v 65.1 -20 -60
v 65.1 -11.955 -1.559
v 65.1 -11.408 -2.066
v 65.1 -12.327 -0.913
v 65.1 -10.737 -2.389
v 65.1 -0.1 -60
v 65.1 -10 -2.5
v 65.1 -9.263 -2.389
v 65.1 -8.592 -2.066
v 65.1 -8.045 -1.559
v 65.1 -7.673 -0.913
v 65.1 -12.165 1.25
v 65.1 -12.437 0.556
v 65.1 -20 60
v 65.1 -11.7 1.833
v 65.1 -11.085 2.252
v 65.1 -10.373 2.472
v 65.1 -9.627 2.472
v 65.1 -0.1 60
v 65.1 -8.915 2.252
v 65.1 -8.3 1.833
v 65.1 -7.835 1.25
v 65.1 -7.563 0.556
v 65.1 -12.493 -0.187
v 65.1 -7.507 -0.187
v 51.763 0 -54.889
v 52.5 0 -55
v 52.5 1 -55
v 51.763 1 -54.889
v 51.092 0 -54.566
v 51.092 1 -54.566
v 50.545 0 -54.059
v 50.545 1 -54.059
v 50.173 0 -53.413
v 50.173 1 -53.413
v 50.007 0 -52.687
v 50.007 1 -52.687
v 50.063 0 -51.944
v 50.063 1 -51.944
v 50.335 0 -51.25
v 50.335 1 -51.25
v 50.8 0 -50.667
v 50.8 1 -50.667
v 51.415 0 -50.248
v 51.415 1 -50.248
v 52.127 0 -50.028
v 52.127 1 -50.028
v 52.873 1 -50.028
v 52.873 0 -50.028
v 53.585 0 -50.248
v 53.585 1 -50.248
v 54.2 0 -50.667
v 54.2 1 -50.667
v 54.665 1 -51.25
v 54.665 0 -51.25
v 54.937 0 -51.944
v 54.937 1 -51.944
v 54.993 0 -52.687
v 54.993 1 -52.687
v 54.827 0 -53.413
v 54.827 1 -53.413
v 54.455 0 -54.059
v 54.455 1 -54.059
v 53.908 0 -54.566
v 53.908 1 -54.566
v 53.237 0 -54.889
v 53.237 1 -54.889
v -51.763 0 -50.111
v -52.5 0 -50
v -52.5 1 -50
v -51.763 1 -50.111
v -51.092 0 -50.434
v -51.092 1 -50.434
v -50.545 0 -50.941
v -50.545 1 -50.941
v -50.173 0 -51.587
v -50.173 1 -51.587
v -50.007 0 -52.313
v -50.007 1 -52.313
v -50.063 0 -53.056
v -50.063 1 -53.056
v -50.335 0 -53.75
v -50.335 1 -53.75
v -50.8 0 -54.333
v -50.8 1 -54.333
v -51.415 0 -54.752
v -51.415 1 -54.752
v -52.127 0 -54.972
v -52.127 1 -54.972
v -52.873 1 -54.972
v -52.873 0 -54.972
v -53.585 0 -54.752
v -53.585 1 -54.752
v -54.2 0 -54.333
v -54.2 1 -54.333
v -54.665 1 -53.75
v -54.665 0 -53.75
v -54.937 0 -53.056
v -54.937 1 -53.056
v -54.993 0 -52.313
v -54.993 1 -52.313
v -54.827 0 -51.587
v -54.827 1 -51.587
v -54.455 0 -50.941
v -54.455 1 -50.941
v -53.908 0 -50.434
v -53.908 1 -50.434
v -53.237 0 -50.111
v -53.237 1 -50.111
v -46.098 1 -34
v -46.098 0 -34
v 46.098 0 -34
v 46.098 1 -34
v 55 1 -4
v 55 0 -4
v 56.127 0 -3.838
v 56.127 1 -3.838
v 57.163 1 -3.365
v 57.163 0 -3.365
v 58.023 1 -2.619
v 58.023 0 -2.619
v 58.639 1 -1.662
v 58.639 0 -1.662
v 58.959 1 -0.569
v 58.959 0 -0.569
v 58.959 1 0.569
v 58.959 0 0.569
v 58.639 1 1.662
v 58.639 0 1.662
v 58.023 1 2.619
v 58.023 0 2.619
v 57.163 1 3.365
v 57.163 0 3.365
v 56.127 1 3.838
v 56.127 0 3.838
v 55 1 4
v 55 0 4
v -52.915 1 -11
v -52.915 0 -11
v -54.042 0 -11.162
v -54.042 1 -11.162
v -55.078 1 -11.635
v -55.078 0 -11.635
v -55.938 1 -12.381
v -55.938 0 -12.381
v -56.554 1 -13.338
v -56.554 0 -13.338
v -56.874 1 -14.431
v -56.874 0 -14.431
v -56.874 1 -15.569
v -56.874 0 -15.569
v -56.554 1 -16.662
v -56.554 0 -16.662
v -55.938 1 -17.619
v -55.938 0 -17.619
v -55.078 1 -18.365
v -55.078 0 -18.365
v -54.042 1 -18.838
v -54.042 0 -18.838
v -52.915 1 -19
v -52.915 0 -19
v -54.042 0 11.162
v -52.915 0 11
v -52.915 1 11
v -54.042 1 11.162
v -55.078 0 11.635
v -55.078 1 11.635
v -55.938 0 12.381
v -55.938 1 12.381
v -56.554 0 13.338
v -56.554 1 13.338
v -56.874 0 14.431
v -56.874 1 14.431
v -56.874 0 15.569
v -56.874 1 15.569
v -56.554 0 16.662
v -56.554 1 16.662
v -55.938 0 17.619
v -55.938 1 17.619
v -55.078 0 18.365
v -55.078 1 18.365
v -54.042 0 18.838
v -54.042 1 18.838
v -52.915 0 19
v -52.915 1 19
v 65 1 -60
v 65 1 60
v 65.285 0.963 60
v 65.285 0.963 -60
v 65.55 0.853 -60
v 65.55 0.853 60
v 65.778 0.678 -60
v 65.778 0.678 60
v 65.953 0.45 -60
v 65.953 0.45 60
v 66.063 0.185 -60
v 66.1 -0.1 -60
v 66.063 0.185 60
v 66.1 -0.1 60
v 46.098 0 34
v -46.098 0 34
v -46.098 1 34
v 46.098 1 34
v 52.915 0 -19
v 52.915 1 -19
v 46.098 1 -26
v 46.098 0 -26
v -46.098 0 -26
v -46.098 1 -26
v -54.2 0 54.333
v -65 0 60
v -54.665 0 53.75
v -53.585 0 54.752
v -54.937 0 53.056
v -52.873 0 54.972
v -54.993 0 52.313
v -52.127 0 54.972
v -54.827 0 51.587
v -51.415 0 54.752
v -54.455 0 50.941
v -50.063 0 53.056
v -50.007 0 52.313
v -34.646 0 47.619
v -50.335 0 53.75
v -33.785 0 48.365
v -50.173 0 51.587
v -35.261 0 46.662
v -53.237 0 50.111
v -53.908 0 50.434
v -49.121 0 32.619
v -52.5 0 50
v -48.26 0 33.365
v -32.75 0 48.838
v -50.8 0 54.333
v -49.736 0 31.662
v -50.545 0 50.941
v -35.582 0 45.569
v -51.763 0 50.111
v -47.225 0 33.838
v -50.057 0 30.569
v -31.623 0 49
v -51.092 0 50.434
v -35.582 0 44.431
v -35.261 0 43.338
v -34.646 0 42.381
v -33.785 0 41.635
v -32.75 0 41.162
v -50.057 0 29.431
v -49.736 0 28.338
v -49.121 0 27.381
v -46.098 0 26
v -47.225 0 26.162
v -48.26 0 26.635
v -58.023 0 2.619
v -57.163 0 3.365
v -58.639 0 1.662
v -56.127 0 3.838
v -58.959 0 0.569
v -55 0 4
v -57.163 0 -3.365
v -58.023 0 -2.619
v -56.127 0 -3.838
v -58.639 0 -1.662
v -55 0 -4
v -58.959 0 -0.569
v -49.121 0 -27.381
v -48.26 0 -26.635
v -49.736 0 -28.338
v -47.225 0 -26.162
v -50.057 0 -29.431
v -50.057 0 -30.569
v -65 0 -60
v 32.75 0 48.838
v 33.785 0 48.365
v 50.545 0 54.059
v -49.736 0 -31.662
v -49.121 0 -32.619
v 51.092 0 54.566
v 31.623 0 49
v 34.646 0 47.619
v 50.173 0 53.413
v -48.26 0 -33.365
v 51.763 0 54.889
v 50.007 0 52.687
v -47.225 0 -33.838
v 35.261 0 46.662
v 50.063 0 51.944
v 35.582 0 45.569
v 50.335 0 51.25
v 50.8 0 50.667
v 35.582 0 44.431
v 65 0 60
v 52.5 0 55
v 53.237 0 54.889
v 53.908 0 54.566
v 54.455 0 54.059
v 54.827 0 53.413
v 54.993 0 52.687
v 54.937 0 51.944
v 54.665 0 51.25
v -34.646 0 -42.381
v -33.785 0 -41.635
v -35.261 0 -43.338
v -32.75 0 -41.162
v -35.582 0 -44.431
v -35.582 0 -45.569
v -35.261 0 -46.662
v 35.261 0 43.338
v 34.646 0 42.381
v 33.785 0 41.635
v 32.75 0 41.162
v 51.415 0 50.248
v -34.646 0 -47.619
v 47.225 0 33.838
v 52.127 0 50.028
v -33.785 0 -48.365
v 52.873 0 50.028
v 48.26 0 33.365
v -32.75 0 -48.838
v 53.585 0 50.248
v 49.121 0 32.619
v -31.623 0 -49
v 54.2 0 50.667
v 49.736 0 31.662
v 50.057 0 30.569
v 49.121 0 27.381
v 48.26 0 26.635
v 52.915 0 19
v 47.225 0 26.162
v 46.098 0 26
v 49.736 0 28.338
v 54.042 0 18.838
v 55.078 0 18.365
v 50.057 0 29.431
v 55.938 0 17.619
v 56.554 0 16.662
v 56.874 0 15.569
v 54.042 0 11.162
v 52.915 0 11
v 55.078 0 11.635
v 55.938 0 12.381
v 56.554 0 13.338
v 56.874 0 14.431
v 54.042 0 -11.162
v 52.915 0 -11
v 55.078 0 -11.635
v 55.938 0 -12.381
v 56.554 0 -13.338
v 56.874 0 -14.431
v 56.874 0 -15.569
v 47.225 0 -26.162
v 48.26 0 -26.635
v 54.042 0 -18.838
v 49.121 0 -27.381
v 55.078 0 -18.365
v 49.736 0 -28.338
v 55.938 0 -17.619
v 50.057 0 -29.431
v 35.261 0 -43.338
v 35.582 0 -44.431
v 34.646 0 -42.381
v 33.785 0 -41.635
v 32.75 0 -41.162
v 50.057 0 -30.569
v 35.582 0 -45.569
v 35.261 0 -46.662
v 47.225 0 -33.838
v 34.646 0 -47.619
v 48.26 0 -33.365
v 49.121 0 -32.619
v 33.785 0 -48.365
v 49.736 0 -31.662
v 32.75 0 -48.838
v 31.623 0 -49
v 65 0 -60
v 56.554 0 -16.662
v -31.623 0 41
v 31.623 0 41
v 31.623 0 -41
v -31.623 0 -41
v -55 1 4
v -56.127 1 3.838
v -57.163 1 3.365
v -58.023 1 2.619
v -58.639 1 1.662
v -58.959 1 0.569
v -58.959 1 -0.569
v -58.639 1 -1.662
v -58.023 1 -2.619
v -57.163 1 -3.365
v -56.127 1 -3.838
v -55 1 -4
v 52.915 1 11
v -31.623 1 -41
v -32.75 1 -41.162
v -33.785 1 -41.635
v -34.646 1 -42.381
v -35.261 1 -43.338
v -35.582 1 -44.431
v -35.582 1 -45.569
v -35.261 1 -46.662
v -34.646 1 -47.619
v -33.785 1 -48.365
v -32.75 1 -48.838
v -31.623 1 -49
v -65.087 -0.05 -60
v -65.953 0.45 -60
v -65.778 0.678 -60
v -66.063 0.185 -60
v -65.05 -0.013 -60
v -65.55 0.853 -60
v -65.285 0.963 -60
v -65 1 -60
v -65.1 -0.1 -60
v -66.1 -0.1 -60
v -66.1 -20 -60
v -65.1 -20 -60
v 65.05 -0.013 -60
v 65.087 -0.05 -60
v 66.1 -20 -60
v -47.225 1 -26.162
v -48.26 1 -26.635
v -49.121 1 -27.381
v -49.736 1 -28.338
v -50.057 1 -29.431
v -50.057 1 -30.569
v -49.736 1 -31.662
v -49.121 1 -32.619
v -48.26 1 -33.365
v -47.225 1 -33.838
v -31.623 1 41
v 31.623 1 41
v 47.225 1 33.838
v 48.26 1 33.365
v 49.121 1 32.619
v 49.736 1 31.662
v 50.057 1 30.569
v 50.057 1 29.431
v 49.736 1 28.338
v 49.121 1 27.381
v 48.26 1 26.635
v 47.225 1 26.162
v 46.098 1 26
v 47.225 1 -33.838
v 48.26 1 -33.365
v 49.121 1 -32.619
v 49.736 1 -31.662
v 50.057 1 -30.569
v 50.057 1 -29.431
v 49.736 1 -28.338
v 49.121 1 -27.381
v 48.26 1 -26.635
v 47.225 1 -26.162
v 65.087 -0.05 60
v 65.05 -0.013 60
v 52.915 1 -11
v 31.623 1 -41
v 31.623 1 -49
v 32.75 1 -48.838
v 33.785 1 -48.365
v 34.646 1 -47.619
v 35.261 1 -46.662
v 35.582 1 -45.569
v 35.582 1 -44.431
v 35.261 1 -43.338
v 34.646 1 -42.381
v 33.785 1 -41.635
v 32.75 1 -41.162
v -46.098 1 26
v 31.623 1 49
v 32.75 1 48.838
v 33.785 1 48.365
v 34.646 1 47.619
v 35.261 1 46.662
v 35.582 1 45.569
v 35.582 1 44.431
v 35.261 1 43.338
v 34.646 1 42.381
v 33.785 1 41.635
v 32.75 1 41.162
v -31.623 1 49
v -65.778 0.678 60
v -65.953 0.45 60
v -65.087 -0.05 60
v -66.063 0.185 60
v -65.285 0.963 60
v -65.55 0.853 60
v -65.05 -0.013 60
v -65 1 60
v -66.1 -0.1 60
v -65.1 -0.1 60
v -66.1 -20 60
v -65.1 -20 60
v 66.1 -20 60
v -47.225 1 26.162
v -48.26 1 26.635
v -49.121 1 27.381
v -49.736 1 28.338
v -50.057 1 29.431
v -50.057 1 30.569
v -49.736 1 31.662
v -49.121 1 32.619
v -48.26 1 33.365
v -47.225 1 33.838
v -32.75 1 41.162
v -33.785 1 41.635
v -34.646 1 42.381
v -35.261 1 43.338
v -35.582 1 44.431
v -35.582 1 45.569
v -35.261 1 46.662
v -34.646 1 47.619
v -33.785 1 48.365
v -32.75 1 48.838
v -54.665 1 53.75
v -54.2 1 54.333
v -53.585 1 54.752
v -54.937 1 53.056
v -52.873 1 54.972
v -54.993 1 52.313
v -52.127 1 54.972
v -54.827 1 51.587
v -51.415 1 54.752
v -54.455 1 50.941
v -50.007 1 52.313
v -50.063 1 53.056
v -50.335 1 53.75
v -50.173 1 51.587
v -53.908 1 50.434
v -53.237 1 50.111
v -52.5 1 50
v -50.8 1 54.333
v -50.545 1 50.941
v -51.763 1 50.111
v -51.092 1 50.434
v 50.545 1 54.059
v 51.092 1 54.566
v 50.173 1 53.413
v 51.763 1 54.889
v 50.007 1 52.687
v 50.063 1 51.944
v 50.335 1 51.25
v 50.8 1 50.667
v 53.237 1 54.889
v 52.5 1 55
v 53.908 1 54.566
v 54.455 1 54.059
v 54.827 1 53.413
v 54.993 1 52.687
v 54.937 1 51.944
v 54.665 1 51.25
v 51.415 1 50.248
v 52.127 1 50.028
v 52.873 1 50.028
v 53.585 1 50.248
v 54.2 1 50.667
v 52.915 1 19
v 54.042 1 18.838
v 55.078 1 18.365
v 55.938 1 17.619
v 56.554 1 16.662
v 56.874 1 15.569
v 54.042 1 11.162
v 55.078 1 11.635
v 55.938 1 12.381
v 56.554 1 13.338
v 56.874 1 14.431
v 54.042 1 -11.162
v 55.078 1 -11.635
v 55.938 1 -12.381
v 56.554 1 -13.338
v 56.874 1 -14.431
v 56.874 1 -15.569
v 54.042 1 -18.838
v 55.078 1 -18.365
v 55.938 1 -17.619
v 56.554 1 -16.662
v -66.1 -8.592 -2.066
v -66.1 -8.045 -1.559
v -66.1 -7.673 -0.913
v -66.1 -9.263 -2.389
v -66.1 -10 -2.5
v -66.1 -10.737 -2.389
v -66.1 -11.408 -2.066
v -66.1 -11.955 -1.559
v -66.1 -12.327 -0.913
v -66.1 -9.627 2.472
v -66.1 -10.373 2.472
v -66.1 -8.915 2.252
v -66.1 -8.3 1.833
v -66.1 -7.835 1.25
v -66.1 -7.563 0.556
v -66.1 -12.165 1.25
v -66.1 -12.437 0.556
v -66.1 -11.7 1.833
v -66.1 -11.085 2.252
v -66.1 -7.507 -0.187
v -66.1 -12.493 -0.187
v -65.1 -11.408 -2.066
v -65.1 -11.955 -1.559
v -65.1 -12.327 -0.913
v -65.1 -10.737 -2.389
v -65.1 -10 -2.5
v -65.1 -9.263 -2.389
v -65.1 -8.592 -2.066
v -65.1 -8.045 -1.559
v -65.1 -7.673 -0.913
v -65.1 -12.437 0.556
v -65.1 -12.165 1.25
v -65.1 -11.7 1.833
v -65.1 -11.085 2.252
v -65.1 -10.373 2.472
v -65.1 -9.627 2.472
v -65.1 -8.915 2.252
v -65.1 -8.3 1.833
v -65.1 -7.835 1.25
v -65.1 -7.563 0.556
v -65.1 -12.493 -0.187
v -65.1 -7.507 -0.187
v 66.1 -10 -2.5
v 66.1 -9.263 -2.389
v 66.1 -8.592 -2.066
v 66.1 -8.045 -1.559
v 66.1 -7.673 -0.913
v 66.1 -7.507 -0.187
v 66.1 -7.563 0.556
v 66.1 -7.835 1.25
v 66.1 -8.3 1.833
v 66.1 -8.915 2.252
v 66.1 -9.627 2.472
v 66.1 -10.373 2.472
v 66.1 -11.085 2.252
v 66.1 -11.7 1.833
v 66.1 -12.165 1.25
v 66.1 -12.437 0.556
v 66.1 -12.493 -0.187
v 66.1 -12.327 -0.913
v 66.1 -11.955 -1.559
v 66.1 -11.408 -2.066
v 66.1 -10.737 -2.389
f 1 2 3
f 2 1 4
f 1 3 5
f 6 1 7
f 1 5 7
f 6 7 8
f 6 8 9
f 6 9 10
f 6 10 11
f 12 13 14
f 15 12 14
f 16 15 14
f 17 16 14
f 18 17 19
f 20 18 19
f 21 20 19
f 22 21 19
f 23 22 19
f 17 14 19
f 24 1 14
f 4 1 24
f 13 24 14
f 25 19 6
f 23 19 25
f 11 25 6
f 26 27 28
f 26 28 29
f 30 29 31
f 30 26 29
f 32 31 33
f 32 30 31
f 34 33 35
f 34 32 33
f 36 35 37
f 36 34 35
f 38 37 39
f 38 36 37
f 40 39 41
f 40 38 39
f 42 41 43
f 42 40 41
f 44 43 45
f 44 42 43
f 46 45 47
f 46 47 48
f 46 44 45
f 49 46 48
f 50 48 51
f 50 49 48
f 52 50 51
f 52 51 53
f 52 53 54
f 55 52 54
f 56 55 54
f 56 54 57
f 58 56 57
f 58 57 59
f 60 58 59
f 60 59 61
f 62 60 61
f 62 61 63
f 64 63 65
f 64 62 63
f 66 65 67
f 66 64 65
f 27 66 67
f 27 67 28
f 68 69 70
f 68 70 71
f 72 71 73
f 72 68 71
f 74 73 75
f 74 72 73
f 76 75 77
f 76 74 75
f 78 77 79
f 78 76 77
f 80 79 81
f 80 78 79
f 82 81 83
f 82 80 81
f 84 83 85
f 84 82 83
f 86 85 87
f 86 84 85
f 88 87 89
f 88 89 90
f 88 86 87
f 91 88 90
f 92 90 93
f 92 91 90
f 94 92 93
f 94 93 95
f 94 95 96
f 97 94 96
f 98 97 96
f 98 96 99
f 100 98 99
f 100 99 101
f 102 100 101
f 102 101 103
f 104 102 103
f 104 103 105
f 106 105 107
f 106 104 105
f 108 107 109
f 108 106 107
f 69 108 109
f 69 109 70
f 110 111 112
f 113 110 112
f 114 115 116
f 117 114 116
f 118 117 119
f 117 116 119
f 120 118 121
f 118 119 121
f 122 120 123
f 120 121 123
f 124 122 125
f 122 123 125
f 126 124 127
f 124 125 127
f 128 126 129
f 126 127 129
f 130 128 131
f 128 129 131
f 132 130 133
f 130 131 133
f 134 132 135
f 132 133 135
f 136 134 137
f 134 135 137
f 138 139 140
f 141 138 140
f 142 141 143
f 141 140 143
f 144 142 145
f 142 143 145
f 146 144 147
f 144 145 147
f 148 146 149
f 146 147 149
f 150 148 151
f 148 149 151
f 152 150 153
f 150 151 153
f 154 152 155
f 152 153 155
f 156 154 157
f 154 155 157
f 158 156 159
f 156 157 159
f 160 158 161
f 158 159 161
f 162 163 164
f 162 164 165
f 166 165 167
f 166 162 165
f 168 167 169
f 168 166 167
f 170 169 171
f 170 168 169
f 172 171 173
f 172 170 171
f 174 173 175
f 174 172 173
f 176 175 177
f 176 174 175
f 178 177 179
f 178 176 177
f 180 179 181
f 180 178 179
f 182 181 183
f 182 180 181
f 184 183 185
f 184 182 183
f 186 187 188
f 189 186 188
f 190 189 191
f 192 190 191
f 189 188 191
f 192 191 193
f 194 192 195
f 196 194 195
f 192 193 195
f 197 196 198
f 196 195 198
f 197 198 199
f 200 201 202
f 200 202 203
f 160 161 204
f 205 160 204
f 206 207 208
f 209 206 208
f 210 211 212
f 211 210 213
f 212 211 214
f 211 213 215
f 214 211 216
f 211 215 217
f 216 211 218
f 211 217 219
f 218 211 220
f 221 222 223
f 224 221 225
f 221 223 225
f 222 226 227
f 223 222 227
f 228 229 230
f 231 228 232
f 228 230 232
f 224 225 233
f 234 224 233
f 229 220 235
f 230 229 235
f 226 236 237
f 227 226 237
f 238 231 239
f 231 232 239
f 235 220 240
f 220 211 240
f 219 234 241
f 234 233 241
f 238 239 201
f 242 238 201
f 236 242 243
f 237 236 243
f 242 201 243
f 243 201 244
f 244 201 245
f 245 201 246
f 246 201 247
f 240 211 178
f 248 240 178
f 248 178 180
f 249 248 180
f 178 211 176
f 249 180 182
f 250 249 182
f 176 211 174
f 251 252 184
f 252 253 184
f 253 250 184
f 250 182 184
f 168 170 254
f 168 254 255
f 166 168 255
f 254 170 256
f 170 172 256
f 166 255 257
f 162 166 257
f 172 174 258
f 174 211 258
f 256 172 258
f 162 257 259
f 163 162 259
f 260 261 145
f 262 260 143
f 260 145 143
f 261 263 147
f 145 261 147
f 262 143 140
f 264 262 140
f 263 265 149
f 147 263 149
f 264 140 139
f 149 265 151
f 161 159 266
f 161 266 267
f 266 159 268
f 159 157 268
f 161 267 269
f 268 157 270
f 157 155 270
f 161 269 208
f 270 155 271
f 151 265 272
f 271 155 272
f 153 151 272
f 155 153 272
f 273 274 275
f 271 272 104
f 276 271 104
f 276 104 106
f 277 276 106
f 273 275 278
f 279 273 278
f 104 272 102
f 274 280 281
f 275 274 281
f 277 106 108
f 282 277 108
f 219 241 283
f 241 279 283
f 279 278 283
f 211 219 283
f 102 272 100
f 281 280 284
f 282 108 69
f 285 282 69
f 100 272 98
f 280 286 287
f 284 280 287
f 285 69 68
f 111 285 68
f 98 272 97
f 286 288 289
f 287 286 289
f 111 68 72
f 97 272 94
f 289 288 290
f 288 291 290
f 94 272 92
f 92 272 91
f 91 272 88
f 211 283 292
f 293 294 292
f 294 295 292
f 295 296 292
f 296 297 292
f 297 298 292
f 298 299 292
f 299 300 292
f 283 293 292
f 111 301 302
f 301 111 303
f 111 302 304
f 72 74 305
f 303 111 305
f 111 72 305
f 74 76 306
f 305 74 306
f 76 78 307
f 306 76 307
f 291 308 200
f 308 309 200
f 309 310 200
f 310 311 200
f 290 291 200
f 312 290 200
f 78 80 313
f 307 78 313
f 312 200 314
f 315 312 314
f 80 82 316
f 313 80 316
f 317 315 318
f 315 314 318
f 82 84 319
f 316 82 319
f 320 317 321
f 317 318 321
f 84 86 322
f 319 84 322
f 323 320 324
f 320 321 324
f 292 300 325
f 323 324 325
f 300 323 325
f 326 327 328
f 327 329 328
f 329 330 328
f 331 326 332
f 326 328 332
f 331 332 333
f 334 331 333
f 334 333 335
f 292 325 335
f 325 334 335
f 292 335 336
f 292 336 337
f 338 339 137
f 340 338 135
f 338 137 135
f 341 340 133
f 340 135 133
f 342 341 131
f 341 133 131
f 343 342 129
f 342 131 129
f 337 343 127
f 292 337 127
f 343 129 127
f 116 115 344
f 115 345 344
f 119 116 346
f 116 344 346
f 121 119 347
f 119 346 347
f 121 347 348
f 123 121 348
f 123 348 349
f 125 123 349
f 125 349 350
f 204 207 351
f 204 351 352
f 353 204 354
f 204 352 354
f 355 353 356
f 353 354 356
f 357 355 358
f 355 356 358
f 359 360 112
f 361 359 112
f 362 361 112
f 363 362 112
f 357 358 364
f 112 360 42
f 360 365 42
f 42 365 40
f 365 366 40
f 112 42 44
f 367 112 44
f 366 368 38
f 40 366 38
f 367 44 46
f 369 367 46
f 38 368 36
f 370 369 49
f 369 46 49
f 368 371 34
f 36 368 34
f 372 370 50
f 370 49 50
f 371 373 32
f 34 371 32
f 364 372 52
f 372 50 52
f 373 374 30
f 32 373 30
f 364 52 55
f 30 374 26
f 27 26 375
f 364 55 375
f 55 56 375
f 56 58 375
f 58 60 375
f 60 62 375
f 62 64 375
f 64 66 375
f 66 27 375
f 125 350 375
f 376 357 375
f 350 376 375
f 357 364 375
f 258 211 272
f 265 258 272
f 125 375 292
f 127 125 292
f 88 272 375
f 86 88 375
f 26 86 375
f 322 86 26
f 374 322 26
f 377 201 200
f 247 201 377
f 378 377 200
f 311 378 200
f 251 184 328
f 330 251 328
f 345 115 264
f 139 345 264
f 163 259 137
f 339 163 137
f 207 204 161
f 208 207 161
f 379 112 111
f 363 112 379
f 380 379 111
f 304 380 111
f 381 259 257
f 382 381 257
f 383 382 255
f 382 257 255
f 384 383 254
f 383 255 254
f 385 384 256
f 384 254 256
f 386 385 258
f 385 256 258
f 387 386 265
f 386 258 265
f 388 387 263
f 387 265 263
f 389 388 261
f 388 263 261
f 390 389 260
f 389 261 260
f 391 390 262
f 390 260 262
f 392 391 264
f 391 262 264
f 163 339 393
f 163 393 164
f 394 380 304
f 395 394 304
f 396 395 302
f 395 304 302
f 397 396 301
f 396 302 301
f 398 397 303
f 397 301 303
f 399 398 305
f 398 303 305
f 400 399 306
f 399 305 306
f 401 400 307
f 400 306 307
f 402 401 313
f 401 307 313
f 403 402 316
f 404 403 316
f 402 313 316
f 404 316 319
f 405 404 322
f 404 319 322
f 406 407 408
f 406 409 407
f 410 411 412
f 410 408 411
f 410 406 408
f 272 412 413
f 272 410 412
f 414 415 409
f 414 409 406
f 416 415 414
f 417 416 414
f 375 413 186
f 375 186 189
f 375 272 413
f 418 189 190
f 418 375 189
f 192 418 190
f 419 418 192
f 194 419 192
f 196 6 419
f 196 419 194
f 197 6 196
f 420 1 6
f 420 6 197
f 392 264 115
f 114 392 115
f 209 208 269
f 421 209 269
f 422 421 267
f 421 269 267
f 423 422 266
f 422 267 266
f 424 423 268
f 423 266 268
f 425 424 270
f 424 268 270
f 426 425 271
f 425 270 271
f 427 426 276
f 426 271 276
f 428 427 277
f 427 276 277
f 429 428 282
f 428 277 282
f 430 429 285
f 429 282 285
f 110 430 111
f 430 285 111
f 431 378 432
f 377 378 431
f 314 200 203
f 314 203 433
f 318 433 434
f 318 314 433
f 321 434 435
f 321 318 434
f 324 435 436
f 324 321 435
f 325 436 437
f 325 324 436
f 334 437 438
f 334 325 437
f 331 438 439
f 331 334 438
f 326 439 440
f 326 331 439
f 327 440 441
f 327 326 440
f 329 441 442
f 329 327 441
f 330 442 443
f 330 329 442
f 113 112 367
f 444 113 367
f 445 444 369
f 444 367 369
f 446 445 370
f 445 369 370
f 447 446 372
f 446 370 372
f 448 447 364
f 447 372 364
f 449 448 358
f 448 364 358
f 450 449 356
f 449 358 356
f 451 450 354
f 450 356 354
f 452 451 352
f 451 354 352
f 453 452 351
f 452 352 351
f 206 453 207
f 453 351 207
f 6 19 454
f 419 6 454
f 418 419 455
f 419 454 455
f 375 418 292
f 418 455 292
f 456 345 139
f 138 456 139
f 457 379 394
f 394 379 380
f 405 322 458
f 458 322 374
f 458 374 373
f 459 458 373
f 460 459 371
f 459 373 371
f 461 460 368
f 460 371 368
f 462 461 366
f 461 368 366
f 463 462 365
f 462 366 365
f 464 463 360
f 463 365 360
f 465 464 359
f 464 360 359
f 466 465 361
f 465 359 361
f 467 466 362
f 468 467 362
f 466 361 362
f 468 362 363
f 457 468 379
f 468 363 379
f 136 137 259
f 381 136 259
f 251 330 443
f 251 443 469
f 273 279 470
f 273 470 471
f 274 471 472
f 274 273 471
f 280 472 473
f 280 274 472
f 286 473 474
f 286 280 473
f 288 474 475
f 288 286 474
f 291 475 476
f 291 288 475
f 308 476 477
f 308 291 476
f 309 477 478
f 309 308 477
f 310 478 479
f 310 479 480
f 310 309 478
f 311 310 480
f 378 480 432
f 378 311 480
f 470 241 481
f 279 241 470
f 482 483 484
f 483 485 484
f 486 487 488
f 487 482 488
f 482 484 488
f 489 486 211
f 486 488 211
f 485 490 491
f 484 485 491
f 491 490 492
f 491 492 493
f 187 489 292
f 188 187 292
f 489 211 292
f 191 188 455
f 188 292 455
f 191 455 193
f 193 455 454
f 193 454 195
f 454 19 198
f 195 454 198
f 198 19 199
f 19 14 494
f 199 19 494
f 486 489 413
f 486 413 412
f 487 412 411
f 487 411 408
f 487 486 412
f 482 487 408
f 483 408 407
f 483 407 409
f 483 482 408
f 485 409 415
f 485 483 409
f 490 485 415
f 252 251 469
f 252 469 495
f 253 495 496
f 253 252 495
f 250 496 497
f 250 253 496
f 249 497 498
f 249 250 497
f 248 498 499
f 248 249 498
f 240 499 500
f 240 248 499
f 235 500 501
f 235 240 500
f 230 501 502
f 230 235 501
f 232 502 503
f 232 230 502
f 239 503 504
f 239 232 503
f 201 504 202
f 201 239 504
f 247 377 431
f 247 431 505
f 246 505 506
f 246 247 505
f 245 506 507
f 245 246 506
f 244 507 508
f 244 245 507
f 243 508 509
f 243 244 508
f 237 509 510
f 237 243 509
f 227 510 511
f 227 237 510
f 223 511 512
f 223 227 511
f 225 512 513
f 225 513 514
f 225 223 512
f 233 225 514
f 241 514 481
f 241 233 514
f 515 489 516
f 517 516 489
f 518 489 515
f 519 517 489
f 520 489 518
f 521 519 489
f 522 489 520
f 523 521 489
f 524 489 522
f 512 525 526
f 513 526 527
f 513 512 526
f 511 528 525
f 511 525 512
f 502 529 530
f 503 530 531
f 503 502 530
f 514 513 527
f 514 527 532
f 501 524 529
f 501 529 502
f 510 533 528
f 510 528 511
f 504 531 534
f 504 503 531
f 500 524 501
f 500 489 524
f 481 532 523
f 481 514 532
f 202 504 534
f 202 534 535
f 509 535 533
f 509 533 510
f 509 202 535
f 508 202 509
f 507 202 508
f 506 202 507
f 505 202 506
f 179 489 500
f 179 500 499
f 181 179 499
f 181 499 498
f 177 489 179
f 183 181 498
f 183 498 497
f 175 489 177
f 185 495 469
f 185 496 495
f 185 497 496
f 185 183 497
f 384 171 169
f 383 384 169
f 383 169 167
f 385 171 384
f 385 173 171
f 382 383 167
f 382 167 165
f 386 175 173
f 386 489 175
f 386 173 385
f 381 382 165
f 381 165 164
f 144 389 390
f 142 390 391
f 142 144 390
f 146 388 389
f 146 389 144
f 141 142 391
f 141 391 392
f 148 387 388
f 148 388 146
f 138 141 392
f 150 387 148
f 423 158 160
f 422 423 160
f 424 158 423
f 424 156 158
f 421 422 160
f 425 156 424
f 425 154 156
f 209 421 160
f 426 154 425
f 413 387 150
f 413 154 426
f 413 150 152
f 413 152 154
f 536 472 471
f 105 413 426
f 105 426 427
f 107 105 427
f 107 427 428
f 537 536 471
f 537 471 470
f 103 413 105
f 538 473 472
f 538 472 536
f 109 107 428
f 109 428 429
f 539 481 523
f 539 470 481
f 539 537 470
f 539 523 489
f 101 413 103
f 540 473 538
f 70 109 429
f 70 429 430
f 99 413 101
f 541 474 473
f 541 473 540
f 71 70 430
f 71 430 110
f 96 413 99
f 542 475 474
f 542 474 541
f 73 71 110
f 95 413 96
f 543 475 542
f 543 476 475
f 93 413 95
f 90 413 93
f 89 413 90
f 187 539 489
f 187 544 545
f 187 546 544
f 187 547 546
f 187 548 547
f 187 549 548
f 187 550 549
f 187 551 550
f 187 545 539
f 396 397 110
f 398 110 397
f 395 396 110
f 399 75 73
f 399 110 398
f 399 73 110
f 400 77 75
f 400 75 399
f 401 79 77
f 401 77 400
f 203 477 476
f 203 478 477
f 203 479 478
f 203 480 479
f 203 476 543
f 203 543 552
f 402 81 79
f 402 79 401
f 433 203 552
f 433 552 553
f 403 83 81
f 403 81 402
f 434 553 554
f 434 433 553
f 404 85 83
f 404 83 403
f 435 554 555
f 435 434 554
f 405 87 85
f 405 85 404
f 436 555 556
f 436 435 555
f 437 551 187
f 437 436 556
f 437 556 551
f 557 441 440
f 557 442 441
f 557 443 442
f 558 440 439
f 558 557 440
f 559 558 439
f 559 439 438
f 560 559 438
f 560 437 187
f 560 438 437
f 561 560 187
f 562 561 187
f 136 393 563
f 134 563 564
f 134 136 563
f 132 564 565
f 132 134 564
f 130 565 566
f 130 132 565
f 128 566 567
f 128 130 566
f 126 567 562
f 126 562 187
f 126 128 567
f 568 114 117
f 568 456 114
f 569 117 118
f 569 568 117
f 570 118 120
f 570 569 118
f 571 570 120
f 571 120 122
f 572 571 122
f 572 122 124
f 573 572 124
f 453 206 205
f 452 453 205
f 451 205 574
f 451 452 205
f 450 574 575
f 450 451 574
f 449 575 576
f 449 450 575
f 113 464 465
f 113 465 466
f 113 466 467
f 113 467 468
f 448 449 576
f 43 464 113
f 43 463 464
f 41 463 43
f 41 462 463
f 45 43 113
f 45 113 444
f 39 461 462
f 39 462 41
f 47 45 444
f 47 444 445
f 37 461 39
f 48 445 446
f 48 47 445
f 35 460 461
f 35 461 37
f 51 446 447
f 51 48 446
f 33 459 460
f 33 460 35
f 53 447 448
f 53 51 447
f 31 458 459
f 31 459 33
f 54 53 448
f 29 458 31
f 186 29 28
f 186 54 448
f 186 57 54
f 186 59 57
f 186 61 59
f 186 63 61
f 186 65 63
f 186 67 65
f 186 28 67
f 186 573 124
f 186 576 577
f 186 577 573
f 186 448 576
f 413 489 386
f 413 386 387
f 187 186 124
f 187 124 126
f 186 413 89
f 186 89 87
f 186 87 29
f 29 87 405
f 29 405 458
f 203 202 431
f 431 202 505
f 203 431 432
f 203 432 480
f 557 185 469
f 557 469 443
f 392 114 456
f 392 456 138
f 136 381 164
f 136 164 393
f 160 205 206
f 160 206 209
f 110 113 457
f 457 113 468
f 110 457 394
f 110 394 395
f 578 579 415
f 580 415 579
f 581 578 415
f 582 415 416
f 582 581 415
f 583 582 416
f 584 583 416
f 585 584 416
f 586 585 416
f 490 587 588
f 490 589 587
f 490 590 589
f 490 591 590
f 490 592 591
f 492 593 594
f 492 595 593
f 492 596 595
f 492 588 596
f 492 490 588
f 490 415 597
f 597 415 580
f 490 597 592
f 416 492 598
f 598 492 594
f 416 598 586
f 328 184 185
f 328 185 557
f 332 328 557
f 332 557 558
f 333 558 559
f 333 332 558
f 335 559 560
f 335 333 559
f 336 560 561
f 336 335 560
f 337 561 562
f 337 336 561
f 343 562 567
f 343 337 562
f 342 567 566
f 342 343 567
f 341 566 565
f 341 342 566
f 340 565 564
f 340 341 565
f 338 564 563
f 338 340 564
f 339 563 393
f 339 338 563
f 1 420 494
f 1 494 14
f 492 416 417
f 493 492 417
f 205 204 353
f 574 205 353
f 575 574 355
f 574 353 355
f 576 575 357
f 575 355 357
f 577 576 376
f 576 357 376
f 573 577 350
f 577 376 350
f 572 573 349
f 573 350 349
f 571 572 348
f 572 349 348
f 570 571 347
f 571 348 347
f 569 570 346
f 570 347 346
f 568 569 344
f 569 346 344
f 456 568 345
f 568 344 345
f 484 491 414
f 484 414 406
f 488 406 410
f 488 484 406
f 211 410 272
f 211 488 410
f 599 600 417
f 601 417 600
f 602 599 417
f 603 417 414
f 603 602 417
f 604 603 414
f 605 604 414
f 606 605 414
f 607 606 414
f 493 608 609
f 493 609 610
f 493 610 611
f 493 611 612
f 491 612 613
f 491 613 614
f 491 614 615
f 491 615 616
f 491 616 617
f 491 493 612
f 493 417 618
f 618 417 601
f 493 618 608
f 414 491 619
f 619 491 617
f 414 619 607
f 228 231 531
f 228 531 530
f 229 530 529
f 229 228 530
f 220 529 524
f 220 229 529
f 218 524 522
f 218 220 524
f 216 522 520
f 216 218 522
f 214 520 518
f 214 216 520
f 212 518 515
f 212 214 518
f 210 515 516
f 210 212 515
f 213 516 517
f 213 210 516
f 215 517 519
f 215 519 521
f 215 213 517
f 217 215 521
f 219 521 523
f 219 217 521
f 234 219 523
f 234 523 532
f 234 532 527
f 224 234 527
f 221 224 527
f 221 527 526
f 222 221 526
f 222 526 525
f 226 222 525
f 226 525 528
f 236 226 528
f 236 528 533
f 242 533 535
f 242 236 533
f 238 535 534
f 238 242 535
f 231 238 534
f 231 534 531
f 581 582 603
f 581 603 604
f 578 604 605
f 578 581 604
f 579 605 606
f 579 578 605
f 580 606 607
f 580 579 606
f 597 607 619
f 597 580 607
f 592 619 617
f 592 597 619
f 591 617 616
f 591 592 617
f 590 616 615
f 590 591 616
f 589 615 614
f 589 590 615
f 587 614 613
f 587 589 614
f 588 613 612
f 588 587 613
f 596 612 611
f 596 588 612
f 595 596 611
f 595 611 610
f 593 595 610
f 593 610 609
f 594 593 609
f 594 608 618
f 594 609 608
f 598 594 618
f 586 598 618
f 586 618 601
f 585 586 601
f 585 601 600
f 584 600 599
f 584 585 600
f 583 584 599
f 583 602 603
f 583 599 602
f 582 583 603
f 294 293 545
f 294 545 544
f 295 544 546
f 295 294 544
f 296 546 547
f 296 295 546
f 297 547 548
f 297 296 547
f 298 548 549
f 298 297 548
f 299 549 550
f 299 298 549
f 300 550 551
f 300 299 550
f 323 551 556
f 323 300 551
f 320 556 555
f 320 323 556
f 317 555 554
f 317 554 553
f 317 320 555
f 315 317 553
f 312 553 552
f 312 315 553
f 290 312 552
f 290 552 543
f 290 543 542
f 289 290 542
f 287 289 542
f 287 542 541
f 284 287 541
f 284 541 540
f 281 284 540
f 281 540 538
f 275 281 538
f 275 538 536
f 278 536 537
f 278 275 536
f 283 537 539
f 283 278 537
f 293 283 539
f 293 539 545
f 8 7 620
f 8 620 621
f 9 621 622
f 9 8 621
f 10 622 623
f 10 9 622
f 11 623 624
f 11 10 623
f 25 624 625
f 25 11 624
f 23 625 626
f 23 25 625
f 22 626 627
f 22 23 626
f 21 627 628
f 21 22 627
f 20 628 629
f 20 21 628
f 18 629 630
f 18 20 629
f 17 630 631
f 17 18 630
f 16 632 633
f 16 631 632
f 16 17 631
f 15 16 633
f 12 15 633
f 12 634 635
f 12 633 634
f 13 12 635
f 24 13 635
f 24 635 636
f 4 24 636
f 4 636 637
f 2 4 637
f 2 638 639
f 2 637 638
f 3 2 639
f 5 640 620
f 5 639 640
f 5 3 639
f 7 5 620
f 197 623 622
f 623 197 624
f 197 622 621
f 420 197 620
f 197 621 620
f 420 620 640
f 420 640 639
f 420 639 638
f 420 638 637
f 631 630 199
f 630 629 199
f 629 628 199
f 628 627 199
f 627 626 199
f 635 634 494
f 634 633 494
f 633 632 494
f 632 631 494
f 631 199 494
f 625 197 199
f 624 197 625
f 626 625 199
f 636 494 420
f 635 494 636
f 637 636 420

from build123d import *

# Parameters (mm, degrees)
SKETCH1_W               = 130
SKETCH1_H               = 120
SKETCH1_R               = 2.5
BOSS_EXTRUDE1_DEPTH     = 1
EDGE_FLANGE1_DEPTH      = 120
CUT_EXTRUDE1_DEPTH      = 92.48338647
CUT_EXTRUDE1_DEPTH_BACK = 92.48338647
SKETCH10_R              = 2.5


# Sheet-metal steps are written as plain solids
with BuildPart() as part:
    # Sketch1 → Boss-Extrude1 (new body)
    with BuildSketch(Plane(origin=(0, 0, 0), x_dir=(1, 0, 0), z_dir=(0, 1, 0))):
        Rectangle(SKETCH1_W, SKETCH1_H)
        with Locations(Location((-52.5, 52.5, 0), (0, 0, 270))):
            Circle(SKETCH1_R, mode=Mode.SUBTRACT)
        with Locations(Location((52.5, 52.5, 0), (0, 0, 90))):
            Circle(SKETCH1_R, mode=Mode.SUBTRACT)
        with Locations(Location((52.5, -52.5, 0), (0, 0, 270))):
            Circle(SKETCH1_R, mode=Mode.SUBTRACT)
        with Locations(Location((-52.5, -52.5, 0), (0, 0, 90))):
            Circle(SKETCH1_R, mode=Mode.SUBTRACT)
        with BuildLine():
            Line((-31.622776602, 49), (31.622776602, 49))
            ThreePointArc((31.622776602, 49), (35.622776602, 45), (31.622776602, 41))
            Line((31.622776602, 41), (-31.622776602, 41))
            ThreePointArc((-31.622776602, 41), (-35.622776602, 45), (-31.622776602, 49))
        make_face(mode=Mode.SUBTRACT)
        with BuildLine():
            Line((-46.097722286, 34), (46.097722286, 34))
            ThreePointArc((46.097722286, 34), (50.097722286, 30), (46.097722286, 26))
            Line((46.097722286, 26), (-46.097722286, 26))
            ThreePointArc((-46.097722286, 26), (-50.097722286, 30), (-46.097722286, 34))
        make_face(mode=Mode.SUBTRACT)
        with BuildLine():
            Line((-52.915026221, 19), (52.915026221, 19))
            ThreePointArc((52.915026221, 19), (56.915026221, 15), (52.915026221, 11))
            Line((52.915026221, 11), (-52.915026221, 11))
            ThreePointArc((-52.915026221, 11), (-56.915026221, 15), (-52.915026221, 19))
        make_face(mode=Mode.SUBTRACT)
        with BuildLine():
            Line((-55, 4), (55, 4))
            ThreePointArc((55, 4), (59, 0), (55, -4))
            Line((55, -4), (-55, -4))
            ThreePointArc((-55, -4), (-59, 0), (-55, 4))
        make_face(mode=Mode.SUBTRACT)
        with BuildLine():
            Line((-52.915026221, -19), (52.915026221, -19))
            ThreePointArc((52.915026221, -19), (56.915026221, -15), (52.915026221, -11))
            Line((52.915026221, -11), (-52.915026221, -11))
            ThreePointArc((-52.915026221, -11), (-56.915026221, -15), (-52.915026221, -19))
        make_face(mode=Mode.SUBTRACT)
        with BuildLine():
            Line((-46.097722286, -34), (46.097722286, -34))
            ThreePointArc((46.097722286, -34), (50.097722286, -30), (46.097722286, -26))
            Line((46.097722286, -26), (-46.097722286, -26))
            ThreePointArc((-46.097722286, -26), (-50.097722286, -30), (-46.097722286, -34))
        make_face(mode=Mode.SUBTRACT)
        with BuildLine():
            Line((-31.622776602, -49), (31.622776602, -49))
            ThreePointArc((31.622776602, -49), (35.622776602, -45), (31.622776602, -41))
            Line((31.622776602, -41), (-31.622776602, -41))
            ThreePointArc((-31.622776602, -41), (-35.622776602, -45), (-31.622776602, -49))
        make_face(mode=Mode.SUBTRACT)
    extrude(amount=BOSS_EXTRUDE1_DEPTH)

    # Edge-Flange1 section (across the edge) → Edge-Flange1 (add)
    with BuildSketch(Plane(origin=(-65.1, 0, 60), x_dir=(1, 0, 0), z_dir=(0, 0, -1))):
        with BuildLine():
            Line((-1, 0.1), (-1, 20))
            Line((-1, 20), (0, 20))
            Line((0, 20), (0, 0.1))
            ThreePointArc((0, 0.1), (0.029289322, 0.029289322), (0.1, 0))
            Line((0.1, 0), (0.1, -1))
            ThreePointArc((0.1, -1), (-0.677817459, -0.677817459), (-1, 0.1))
        make_face()
    edge_flange1 = extrude(amount=EDGE_FLANGE1_DEPTH)

    # Mirror1: Edge-Flange1 across plane
    add(edge_flange1.mirror(Plane(origin=(0, 0, 0), x_dir=(0, 0, 1), z_dir=(1, 0, 0))))

    # Sketch10 → Cut-Extrude1 (cut, two sides: drawn at the far end of the back side and taken through both)
    with BuildSketch(Plane(origin=(0, 0, 0), x_dir=(0, 0, -1), z_dir=(1, 0, 0)).offset(-CUT_EXTRUDE1_DEPTH_BACK)):
        with Locations((0, -10)):
            Circle(SKETCH10_R)
    extrude(amount=CUT_EXTRUDE1_DEPTH + CUT_EXTRUDE1_DEPTH_BACK, mode=Mode.SUBTRACT)


solid = part.part
